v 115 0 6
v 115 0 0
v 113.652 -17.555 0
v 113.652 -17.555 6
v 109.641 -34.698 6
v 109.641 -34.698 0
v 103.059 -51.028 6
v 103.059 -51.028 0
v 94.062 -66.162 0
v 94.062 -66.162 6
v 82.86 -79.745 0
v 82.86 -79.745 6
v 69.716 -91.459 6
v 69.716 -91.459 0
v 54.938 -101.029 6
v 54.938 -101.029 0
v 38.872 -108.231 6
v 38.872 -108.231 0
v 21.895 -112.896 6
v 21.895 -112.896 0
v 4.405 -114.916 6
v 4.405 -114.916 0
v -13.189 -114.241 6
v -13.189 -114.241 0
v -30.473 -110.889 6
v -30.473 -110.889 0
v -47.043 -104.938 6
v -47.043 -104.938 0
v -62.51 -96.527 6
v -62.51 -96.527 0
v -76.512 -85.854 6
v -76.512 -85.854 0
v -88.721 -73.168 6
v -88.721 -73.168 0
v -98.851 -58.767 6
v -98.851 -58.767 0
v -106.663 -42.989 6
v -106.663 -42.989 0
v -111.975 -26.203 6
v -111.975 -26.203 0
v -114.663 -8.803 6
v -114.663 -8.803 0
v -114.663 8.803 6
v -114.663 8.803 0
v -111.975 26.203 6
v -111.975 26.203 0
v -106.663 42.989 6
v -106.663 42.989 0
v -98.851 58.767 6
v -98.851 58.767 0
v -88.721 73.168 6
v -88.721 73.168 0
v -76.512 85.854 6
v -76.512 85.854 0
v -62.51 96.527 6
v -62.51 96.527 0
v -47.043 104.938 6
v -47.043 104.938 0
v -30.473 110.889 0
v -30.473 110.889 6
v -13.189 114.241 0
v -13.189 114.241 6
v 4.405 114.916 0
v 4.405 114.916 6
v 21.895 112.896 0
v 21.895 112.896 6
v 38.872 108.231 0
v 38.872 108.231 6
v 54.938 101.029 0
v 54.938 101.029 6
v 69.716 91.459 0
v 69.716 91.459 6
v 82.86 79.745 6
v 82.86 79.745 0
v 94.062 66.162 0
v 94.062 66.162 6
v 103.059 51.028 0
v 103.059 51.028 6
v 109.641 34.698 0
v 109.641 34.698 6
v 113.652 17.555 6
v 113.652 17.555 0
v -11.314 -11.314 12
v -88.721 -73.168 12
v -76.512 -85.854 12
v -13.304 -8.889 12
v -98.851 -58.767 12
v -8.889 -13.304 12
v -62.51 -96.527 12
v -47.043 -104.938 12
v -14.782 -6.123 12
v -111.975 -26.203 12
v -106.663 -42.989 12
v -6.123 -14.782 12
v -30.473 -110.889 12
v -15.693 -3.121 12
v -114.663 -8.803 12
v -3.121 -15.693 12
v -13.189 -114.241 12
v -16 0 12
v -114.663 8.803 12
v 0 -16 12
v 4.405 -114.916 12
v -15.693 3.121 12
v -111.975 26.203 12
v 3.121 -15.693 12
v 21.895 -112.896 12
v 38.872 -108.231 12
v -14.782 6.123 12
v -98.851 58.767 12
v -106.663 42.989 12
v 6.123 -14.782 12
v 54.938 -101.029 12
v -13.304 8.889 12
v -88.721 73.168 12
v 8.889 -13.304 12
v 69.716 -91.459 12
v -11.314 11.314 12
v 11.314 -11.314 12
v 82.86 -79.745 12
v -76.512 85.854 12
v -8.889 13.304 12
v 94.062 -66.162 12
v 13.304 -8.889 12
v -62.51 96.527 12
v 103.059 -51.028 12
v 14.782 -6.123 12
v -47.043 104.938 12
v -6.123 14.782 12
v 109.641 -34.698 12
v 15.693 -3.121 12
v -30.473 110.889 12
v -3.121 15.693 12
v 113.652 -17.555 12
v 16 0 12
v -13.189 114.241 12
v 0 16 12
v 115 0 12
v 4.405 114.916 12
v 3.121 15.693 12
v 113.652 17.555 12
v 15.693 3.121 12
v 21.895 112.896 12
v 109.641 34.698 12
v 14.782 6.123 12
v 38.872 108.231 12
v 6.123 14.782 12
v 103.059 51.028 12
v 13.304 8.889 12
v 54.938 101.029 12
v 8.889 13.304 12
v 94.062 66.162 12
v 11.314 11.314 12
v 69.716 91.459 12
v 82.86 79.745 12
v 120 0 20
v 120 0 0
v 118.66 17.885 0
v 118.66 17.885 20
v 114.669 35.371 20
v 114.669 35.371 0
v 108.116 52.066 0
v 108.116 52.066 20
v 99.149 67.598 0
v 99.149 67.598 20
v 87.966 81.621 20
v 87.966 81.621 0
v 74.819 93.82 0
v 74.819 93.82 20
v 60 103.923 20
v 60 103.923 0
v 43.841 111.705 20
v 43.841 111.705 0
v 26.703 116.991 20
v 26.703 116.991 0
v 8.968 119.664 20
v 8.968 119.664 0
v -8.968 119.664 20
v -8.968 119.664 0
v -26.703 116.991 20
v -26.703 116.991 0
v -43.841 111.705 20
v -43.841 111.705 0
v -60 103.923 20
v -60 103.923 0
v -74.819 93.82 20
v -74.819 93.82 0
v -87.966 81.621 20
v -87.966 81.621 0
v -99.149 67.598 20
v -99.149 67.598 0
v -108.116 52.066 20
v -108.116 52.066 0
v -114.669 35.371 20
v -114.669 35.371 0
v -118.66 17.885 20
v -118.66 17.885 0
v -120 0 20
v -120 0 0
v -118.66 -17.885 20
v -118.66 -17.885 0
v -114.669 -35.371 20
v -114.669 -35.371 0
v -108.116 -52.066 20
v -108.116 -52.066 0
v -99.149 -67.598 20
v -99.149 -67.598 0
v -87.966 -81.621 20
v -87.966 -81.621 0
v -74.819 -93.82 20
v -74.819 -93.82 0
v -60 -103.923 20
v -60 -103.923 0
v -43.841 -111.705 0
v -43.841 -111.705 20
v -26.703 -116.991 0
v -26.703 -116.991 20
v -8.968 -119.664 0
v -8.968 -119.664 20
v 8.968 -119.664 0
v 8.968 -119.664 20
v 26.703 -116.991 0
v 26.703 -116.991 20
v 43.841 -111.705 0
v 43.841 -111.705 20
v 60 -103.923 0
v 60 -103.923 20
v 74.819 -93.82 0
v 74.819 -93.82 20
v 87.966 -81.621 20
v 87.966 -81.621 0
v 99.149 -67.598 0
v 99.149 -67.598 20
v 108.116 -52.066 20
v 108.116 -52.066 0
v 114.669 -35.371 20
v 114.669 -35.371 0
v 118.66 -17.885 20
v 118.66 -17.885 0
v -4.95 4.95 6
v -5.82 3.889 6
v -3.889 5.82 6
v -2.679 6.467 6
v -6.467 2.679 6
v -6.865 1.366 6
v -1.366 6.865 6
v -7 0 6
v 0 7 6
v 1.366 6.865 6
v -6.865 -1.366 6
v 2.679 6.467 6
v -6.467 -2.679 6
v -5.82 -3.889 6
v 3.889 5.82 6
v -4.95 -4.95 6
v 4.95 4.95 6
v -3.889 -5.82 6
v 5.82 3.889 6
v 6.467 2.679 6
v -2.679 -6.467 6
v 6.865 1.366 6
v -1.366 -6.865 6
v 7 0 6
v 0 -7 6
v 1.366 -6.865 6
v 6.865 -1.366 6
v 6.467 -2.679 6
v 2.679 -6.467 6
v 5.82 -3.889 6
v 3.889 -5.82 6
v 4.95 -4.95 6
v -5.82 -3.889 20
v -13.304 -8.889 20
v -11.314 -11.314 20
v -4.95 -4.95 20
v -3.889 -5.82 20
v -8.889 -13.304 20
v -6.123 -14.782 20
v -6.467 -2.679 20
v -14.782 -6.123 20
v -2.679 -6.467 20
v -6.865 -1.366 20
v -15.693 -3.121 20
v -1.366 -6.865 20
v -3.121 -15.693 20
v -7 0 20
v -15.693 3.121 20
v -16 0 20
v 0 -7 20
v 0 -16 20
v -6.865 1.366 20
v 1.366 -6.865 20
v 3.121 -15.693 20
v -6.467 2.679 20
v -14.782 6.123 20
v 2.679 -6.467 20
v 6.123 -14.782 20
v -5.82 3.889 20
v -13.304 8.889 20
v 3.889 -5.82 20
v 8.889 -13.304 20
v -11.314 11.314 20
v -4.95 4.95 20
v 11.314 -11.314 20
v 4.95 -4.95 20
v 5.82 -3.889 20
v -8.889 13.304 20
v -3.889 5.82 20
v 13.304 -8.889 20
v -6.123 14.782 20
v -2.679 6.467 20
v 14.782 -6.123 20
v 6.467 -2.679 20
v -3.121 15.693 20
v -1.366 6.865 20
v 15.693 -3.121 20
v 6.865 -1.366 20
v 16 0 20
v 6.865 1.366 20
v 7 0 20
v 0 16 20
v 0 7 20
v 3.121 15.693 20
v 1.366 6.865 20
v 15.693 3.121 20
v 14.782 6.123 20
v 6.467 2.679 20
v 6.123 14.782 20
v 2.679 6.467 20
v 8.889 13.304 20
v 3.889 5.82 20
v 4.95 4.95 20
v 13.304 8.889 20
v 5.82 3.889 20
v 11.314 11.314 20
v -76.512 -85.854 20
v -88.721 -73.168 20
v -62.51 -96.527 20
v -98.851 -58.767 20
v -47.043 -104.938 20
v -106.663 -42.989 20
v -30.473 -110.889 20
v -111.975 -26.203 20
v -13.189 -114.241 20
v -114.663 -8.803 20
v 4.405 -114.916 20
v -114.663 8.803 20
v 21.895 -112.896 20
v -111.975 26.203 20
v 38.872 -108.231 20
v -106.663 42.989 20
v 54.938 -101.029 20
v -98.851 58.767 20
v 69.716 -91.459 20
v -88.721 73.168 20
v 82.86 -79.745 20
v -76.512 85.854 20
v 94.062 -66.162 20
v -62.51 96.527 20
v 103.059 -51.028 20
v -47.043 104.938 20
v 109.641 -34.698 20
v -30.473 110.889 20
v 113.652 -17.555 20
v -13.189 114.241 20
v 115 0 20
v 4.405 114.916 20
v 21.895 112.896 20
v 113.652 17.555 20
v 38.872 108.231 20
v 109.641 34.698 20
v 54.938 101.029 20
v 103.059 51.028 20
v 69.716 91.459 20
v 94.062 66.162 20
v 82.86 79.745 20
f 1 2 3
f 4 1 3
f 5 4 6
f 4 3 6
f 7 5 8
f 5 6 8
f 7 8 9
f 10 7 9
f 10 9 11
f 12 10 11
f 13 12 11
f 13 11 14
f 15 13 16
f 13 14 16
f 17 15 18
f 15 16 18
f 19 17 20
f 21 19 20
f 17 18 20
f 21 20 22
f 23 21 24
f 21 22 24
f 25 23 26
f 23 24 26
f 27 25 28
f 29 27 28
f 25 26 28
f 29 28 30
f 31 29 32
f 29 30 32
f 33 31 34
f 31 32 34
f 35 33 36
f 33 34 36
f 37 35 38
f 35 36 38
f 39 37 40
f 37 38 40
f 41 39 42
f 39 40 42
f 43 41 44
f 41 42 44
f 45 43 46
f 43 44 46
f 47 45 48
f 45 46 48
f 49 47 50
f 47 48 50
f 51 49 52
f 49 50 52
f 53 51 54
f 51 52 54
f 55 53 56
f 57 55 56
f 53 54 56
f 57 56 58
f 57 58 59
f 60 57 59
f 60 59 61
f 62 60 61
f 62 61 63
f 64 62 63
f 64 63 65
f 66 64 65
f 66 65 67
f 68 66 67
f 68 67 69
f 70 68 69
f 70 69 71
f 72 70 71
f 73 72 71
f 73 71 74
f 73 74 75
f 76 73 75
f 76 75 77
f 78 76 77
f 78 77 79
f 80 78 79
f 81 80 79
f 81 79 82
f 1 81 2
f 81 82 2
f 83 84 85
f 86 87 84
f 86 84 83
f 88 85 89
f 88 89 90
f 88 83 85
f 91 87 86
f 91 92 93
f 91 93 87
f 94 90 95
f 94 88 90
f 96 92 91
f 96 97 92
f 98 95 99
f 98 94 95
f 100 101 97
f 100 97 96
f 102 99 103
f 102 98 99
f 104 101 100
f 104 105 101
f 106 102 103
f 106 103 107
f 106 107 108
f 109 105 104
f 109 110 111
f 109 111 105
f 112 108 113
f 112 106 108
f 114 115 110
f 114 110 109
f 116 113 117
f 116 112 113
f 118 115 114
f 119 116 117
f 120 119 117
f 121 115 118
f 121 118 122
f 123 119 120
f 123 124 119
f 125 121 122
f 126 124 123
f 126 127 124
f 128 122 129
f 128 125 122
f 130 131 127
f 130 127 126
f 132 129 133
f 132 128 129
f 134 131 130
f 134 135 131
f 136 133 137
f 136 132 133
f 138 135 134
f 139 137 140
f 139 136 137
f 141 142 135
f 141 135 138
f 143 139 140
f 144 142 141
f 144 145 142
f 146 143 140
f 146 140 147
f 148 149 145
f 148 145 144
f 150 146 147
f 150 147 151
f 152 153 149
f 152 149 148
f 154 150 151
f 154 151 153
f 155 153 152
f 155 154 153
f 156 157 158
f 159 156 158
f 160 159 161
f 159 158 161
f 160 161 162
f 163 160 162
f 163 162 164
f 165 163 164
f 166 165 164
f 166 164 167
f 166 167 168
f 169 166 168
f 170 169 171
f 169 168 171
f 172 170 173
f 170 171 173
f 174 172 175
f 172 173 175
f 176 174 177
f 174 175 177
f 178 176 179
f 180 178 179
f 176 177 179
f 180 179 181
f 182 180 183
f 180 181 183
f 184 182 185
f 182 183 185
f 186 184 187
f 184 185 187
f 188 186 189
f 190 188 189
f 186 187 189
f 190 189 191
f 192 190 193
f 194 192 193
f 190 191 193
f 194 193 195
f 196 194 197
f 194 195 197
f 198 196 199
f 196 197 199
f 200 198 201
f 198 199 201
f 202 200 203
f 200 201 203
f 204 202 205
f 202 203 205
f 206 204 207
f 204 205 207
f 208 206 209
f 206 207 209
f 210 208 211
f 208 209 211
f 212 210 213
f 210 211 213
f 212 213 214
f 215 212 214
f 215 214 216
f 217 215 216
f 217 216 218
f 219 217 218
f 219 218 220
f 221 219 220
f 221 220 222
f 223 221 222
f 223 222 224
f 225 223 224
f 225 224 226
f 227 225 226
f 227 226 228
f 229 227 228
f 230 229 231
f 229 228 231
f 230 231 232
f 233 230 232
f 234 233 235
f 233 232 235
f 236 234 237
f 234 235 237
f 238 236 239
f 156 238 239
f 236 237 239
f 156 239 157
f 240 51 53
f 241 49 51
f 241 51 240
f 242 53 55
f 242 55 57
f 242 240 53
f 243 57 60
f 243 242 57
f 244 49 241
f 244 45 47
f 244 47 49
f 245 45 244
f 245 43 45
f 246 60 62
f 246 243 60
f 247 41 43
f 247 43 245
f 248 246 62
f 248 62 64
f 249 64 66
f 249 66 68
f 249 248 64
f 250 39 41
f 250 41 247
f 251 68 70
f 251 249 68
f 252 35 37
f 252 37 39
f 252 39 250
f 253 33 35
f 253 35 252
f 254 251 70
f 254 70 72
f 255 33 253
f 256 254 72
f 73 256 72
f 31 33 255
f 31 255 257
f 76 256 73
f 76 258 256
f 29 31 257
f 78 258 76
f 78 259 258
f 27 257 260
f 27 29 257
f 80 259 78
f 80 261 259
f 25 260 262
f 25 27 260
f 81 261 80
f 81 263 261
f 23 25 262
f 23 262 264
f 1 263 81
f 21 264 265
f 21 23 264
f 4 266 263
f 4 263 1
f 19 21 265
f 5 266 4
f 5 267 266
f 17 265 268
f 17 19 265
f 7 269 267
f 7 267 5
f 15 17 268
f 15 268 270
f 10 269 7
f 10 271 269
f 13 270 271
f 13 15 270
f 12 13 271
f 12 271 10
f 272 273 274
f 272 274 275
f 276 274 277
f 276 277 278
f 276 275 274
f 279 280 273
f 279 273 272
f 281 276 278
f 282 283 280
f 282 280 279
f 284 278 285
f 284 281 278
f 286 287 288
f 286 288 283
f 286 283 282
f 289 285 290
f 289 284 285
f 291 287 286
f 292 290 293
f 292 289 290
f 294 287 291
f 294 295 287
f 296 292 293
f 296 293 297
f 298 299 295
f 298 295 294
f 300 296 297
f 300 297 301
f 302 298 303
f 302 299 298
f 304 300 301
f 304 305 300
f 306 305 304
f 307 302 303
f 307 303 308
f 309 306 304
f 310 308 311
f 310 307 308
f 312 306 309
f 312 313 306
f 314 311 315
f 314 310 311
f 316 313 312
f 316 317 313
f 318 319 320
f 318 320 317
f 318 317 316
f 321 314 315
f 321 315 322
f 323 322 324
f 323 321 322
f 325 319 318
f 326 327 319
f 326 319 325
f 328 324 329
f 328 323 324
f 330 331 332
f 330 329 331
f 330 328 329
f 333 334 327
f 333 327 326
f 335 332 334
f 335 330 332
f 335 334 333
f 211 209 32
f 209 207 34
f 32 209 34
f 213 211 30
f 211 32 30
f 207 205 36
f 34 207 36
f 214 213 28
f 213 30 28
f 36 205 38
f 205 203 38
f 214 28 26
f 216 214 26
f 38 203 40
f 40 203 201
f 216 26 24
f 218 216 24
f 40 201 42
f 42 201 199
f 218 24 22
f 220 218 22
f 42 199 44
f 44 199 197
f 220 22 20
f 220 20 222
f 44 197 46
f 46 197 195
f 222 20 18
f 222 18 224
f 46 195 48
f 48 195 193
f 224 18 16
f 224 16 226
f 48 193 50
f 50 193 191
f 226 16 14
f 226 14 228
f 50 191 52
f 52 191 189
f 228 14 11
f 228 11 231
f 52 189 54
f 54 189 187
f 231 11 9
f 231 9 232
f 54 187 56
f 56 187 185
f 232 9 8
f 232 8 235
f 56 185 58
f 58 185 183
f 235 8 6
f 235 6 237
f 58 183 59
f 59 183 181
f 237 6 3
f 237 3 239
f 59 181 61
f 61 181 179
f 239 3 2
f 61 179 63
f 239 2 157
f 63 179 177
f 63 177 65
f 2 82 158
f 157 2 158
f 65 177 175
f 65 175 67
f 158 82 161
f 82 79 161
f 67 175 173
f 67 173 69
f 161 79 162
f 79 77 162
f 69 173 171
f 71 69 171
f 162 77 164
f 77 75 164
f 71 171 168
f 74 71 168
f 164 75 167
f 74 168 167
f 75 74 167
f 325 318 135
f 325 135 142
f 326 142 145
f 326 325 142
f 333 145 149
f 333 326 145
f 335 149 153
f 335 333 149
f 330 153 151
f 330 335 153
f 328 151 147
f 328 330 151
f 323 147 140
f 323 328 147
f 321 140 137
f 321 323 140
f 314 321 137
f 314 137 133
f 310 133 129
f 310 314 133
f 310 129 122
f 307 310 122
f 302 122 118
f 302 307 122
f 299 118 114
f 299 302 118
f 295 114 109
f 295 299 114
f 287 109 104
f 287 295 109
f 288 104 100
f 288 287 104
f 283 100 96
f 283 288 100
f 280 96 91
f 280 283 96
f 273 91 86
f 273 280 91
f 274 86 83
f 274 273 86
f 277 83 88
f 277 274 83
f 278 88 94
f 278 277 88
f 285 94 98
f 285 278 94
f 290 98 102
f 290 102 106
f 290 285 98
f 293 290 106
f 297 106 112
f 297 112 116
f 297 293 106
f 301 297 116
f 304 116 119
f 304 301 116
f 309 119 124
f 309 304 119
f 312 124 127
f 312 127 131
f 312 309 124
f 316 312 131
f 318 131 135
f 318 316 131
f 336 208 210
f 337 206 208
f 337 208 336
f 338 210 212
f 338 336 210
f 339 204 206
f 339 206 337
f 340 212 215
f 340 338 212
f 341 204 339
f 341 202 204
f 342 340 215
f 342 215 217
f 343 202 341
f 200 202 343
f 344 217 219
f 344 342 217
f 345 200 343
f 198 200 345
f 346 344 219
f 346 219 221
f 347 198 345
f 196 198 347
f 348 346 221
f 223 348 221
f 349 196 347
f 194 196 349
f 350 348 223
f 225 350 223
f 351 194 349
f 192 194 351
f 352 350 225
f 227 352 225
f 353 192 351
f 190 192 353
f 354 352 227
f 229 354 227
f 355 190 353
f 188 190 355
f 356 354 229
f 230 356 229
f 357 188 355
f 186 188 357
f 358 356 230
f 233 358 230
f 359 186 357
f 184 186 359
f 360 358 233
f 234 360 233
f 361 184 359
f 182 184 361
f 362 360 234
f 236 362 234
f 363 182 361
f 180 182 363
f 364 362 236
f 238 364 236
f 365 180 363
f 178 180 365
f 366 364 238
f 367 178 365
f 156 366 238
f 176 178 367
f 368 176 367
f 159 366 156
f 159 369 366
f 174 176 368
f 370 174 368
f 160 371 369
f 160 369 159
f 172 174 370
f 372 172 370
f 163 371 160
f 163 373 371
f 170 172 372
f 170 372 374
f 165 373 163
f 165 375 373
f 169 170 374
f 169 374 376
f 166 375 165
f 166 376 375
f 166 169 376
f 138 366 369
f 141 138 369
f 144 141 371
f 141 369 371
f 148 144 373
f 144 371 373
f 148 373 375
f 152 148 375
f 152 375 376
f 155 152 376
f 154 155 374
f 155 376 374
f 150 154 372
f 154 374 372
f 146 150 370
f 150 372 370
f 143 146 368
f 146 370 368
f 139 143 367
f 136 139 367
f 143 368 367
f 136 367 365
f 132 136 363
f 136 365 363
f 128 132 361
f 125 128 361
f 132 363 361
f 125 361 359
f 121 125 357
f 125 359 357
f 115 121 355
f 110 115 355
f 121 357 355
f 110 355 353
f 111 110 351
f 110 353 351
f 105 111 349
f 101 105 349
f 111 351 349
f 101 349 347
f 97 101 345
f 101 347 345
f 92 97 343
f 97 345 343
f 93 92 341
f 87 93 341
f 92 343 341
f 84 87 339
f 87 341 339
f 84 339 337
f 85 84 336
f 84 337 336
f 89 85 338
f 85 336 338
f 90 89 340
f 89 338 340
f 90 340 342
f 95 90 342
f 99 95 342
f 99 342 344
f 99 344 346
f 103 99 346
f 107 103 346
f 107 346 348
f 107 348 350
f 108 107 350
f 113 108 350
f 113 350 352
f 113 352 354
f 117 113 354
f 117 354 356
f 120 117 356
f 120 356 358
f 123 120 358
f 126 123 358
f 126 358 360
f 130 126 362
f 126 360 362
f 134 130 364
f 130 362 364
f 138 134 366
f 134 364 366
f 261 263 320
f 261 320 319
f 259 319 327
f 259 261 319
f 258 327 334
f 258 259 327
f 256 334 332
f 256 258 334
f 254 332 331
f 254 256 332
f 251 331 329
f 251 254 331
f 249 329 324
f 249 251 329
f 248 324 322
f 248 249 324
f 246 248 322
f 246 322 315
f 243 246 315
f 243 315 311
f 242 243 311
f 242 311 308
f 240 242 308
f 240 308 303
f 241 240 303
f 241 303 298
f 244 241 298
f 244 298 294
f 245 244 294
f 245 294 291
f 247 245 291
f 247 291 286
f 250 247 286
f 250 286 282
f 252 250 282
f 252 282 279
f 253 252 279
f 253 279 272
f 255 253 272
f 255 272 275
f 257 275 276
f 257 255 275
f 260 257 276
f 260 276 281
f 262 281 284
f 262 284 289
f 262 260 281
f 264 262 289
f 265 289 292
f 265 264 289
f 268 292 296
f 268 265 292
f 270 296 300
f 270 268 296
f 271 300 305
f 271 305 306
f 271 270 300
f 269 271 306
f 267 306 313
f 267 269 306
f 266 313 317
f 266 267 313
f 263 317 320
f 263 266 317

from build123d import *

# Parameters (mm, degrees)
SKETCH_R        = 120
SKETCH_R_2      = 7
PAD_DEPTH       = 20
SKETCH001_R     = 115
SKETCH001_R_2   = 16
POCKET_DEPTH    = 8
SKETCH002_R     = 115
POCKET001_DEPTH = 6


with BuildPart() as part:
    # Sketch → Pad (new body)
    with BuildSketch(Plane.XY):
        Circle(SKETCH_R)
        Circle(SKETCH_R_2, mode=Mode.SUBTRACT)
    extrude(amount=PAD_DEPTH)

    # Sketch001 (on DatumPlane) → Pocket (cut)
    with BuildSketch(Plane.XY.offset(20)):
        Circle(SKETCH001_R)
        Circle(SKETCH001_R_2, mode=Mode.SUBTRACT)
    extrude(amount=-POCKET_DEPTH, mode=Mode.SUBTRACT)

    # Sketch002 (on DatumPlane) → Pocket001 (cut)
    with BuildSketch(Plane(origin=(0, 0, 0), x_dir=(1, 0, 0), z_dir=(0, 0, -1))):
        Circle(SKETCH002_R)
    extrude(amount=-POCKET001_DEPTH, mode=Mode.SUBTRACT)


solid = part.part
